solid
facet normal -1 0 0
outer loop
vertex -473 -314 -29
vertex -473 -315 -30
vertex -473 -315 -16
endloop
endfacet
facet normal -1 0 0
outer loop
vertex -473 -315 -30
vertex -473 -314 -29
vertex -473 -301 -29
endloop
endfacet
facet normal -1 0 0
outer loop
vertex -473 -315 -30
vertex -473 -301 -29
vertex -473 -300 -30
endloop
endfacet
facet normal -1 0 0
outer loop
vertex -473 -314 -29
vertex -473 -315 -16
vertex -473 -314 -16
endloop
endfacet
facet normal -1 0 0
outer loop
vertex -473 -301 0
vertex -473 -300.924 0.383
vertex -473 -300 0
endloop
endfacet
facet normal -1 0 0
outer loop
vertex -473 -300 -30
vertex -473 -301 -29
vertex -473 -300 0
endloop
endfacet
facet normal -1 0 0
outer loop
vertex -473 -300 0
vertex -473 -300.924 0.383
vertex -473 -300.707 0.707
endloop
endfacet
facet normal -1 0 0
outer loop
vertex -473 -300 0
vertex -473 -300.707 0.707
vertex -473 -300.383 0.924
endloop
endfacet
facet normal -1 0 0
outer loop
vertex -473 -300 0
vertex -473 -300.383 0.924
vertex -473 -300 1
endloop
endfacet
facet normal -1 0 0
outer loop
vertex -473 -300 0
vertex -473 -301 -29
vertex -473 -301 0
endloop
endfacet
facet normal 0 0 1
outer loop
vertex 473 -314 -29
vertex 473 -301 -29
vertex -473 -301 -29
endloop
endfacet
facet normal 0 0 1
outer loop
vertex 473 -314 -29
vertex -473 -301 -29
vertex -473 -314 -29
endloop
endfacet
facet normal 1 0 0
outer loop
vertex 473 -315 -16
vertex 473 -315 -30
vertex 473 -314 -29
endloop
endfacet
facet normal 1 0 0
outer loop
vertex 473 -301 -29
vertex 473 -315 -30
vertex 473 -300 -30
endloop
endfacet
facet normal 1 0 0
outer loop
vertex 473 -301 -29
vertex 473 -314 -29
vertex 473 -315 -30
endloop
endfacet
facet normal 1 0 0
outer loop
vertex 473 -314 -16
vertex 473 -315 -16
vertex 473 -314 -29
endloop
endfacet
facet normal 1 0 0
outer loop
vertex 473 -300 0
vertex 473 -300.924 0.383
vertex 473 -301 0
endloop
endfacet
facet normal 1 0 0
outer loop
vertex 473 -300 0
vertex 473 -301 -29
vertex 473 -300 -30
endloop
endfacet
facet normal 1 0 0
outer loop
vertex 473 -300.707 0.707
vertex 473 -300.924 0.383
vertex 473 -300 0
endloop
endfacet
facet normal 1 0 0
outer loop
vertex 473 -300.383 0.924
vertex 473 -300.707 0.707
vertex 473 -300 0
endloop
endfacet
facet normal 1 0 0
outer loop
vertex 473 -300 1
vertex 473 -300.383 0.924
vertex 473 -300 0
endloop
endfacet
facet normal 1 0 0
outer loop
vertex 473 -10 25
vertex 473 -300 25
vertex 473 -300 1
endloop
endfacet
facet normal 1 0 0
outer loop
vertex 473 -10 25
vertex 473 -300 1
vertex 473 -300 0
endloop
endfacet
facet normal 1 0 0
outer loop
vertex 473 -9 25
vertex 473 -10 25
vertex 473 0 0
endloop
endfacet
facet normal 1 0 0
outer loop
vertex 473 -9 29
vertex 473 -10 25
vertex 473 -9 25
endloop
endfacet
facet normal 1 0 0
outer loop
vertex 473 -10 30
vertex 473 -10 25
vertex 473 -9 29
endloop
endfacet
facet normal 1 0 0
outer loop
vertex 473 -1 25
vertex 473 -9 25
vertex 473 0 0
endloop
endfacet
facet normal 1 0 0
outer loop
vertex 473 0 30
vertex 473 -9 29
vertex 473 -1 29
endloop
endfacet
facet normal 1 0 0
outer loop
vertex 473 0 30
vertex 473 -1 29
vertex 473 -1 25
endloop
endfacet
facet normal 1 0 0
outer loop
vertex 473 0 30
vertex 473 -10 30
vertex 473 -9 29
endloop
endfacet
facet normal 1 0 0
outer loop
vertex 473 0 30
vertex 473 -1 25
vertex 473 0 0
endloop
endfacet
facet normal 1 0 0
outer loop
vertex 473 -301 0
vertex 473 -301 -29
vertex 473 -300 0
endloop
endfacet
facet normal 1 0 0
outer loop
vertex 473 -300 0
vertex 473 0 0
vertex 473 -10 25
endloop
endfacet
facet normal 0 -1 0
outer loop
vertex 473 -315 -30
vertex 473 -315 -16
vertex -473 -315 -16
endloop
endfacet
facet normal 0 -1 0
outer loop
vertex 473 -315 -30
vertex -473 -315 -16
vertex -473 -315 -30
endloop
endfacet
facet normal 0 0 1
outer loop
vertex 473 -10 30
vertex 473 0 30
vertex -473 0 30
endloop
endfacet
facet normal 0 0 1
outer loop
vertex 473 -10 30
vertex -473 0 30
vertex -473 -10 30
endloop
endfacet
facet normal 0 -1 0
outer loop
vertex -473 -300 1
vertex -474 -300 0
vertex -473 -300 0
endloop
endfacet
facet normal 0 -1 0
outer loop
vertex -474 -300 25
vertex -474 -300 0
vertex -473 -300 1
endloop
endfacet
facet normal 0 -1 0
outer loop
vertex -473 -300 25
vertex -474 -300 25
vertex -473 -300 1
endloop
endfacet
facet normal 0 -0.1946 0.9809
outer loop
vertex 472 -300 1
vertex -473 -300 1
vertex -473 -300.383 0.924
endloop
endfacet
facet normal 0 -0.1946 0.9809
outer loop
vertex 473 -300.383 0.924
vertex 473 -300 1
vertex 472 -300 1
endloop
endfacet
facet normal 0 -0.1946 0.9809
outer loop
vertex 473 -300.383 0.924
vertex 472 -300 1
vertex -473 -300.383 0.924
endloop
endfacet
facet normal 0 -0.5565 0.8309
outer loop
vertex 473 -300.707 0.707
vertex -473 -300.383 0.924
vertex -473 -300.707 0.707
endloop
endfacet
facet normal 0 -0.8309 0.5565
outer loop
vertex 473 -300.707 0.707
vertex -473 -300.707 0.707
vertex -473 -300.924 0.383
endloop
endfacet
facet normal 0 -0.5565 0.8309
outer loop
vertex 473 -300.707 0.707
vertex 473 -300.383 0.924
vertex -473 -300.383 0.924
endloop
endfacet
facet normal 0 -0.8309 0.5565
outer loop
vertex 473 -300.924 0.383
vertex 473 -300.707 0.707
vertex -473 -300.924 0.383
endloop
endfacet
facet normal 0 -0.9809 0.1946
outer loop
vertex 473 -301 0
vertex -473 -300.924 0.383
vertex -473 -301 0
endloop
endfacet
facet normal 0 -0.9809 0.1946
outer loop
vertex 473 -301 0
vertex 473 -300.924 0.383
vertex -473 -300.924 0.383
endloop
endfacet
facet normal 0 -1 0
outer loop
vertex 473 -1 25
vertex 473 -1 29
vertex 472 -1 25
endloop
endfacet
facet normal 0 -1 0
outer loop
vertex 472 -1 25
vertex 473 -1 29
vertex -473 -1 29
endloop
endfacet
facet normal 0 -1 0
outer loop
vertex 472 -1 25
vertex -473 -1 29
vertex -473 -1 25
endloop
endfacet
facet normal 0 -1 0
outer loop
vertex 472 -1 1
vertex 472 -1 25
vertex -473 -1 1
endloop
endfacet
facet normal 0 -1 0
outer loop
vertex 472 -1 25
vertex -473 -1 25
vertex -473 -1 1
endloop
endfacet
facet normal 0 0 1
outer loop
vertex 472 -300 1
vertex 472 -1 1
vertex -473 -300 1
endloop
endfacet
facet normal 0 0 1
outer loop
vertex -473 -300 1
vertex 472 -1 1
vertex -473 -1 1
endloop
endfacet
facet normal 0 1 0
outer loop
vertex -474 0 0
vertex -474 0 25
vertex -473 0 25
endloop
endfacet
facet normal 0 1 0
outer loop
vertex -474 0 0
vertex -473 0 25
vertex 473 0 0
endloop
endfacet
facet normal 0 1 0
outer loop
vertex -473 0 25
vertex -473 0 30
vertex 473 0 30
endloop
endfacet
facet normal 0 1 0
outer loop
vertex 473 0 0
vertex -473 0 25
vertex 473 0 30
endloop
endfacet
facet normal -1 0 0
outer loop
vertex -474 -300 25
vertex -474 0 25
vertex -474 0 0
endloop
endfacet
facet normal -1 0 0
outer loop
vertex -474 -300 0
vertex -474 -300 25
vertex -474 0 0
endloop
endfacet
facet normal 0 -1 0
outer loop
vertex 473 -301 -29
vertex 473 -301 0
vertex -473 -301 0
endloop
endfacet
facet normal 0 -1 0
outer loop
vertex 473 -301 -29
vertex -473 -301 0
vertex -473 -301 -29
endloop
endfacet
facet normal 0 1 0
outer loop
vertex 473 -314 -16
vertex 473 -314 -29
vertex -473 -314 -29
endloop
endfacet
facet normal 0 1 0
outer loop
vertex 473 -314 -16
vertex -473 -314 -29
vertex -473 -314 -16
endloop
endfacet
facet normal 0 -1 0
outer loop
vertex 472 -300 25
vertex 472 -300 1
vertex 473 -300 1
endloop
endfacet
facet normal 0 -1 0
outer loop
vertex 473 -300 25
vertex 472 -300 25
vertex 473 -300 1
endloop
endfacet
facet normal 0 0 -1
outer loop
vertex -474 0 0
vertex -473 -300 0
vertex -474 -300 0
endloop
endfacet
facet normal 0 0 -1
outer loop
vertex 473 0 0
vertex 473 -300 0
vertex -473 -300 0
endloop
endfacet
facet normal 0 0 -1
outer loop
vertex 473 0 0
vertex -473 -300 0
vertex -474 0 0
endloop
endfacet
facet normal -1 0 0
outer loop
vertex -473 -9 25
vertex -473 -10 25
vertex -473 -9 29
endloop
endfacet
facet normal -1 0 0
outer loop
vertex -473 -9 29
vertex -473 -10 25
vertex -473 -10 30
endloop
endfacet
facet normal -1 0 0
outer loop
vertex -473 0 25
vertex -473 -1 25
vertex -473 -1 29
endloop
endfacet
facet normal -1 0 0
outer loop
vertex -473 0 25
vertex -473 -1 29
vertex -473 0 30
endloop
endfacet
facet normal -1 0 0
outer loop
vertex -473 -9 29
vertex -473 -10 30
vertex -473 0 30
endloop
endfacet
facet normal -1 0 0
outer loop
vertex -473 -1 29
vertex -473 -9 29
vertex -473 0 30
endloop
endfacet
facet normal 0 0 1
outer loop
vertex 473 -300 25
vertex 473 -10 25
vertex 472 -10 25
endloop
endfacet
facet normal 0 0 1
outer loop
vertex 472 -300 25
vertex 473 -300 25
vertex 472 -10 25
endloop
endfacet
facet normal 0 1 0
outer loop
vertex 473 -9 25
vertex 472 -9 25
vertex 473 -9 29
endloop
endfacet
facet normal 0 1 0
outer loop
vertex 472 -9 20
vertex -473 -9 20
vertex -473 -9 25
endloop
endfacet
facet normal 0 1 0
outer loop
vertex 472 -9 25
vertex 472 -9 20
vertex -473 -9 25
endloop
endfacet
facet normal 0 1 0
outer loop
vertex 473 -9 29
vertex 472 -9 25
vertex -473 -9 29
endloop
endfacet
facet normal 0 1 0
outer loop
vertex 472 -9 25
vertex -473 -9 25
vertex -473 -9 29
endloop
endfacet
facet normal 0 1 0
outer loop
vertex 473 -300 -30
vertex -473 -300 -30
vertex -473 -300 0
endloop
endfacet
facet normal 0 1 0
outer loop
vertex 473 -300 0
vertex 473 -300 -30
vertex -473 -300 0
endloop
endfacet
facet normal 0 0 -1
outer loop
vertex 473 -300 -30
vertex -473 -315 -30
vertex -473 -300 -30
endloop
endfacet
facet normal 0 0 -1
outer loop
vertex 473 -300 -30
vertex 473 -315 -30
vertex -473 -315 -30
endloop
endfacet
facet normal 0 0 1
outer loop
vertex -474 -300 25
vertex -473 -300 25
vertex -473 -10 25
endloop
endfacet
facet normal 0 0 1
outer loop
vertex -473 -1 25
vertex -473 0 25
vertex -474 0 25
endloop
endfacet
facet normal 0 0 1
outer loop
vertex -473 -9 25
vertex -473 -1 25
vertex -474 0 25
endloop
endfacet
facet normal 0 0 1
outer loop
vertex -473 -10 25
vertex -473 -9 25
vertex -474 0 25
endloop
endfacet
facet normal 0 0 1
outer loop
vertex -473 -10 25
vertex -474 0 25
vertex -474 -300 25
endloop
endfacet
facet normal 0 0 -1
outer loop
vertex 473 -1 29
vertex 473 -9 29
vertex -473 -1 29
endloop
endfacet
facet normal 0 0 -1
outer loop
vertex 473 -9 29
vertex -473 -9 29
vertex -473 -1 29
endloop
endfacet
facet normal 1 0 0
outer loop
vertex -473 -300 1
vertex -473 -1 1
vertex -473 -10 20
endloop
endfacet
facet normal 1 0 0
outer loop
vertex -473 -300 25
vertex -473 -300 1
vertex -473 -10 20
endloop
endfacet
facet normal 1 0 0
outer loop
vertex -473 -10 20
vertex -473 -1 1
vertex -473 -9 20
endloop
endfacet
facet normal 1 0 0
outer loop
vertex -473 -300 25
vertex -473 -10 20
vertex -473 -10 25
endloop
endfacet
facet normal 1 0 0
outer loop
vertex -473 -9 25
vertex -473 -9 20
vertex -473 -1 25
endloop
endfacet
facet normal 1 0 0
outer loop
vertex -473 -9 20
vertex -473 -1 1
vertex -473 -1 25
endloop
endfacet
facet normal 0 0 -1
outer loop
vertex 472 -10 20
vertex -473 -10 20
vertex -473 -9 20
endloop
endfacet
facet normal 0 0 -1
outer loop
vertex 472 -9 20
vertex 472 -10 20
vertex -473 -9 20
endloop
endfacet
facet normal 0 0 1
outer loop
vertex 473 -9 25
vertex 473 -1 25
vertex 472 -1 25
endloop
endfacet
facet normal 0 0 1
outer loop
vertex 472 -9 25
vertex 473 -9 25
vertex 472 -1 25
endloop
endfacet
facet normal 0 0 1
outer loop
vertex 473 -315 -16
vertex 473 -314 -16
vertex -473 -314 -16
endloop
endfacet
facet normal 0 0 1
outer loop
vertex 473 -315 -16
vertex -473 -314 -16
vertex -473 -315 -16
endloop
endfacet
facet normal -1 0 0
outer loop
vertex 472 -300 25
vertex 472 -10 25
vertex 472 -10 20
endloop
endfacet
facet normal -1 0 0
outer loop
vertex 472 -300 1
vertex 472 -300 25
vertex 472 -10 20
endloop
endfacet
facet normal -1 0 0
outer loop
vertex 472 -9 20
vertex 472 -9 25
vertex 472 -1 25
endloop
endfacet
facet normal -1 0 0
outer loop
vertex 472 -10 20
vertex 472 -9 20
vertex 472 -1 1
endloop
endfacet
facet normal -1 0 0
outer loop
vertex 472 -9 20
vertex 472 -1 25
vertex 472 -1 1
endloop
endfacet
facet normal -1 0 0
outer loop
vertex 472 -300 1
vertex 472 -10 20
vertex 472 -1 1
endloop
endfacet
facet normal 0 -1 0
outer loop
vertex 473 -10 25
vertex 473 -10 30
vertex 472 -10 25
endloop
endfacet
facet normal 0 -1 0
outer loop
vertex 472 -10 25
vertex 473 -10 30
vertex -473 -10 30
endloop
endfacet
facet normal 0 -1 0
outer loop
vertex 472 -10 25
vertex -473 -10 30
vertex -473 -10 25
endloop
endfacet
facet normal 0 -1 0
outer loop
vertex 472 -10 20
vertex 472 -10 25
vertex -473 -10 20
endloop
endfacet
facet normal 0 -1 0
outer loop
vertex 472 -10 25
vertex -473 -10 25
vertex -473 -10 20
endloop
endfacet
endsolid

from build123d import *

# Parameters (mm, degrees)
F1_DEPTH      = 300
F3_DEPTH      = 473
F3_DEPTH_BACK = 473
F5_DEPTH      = 473
F5_DEPTH_BACK = 473


with BuildPart() as f1:
    # F0 (on Front) → F1 (new body)
    with BuildSketch(Plane.XZ):
        Polygon((-474, 25), (-474, 0), (473, 0), (473, 25), (472, 25), (472, 1), (-473, 1), (-473, 25), align=None)
    extrude(amount=F1_DEPTH)

    # F2 (on Right) → F3 (join, two sides)
    with BuildSketch(Plane.YZ) as f3_sk:
        with BuildLine():
            Line((-300, -30), (-300, 0))
            Line((-300, 0), (-300, 1))
            ThreePointArc((-300, 1), (-300.707107, 0.707107), (-301, 0))
            Line((-301, 0), (-301, -29))
            Line((-301, -29), (-314, -29))
            Line((-314, -29), (-314, -16))
            Line((-314, -16), (-315, -16))
            Line((-315, -16), (-315, -30))
            Line((-315, -30), (-300, -30))
        make_face()
    extrude(amount=F3_DEPTH)
    extrude(f3_sk.sketch, amount=-F3_DEPTH_BACK)

    # F4 (on Right) → F5 (join, two sides)
    with BuildSketch(Plane.YZ) as f5_sk:
        Polygon((-1, 0), (0, 0), (0, 30), (-10, 30), (-10, 20), (-9, 20), (-9, 29), (-1, 29), align=None)
    extrude(amount=F5_DEPTH)
    extrude(f5_sk.sketch, amount=-F5_DEPTH_BACK)


solid = f1.part
